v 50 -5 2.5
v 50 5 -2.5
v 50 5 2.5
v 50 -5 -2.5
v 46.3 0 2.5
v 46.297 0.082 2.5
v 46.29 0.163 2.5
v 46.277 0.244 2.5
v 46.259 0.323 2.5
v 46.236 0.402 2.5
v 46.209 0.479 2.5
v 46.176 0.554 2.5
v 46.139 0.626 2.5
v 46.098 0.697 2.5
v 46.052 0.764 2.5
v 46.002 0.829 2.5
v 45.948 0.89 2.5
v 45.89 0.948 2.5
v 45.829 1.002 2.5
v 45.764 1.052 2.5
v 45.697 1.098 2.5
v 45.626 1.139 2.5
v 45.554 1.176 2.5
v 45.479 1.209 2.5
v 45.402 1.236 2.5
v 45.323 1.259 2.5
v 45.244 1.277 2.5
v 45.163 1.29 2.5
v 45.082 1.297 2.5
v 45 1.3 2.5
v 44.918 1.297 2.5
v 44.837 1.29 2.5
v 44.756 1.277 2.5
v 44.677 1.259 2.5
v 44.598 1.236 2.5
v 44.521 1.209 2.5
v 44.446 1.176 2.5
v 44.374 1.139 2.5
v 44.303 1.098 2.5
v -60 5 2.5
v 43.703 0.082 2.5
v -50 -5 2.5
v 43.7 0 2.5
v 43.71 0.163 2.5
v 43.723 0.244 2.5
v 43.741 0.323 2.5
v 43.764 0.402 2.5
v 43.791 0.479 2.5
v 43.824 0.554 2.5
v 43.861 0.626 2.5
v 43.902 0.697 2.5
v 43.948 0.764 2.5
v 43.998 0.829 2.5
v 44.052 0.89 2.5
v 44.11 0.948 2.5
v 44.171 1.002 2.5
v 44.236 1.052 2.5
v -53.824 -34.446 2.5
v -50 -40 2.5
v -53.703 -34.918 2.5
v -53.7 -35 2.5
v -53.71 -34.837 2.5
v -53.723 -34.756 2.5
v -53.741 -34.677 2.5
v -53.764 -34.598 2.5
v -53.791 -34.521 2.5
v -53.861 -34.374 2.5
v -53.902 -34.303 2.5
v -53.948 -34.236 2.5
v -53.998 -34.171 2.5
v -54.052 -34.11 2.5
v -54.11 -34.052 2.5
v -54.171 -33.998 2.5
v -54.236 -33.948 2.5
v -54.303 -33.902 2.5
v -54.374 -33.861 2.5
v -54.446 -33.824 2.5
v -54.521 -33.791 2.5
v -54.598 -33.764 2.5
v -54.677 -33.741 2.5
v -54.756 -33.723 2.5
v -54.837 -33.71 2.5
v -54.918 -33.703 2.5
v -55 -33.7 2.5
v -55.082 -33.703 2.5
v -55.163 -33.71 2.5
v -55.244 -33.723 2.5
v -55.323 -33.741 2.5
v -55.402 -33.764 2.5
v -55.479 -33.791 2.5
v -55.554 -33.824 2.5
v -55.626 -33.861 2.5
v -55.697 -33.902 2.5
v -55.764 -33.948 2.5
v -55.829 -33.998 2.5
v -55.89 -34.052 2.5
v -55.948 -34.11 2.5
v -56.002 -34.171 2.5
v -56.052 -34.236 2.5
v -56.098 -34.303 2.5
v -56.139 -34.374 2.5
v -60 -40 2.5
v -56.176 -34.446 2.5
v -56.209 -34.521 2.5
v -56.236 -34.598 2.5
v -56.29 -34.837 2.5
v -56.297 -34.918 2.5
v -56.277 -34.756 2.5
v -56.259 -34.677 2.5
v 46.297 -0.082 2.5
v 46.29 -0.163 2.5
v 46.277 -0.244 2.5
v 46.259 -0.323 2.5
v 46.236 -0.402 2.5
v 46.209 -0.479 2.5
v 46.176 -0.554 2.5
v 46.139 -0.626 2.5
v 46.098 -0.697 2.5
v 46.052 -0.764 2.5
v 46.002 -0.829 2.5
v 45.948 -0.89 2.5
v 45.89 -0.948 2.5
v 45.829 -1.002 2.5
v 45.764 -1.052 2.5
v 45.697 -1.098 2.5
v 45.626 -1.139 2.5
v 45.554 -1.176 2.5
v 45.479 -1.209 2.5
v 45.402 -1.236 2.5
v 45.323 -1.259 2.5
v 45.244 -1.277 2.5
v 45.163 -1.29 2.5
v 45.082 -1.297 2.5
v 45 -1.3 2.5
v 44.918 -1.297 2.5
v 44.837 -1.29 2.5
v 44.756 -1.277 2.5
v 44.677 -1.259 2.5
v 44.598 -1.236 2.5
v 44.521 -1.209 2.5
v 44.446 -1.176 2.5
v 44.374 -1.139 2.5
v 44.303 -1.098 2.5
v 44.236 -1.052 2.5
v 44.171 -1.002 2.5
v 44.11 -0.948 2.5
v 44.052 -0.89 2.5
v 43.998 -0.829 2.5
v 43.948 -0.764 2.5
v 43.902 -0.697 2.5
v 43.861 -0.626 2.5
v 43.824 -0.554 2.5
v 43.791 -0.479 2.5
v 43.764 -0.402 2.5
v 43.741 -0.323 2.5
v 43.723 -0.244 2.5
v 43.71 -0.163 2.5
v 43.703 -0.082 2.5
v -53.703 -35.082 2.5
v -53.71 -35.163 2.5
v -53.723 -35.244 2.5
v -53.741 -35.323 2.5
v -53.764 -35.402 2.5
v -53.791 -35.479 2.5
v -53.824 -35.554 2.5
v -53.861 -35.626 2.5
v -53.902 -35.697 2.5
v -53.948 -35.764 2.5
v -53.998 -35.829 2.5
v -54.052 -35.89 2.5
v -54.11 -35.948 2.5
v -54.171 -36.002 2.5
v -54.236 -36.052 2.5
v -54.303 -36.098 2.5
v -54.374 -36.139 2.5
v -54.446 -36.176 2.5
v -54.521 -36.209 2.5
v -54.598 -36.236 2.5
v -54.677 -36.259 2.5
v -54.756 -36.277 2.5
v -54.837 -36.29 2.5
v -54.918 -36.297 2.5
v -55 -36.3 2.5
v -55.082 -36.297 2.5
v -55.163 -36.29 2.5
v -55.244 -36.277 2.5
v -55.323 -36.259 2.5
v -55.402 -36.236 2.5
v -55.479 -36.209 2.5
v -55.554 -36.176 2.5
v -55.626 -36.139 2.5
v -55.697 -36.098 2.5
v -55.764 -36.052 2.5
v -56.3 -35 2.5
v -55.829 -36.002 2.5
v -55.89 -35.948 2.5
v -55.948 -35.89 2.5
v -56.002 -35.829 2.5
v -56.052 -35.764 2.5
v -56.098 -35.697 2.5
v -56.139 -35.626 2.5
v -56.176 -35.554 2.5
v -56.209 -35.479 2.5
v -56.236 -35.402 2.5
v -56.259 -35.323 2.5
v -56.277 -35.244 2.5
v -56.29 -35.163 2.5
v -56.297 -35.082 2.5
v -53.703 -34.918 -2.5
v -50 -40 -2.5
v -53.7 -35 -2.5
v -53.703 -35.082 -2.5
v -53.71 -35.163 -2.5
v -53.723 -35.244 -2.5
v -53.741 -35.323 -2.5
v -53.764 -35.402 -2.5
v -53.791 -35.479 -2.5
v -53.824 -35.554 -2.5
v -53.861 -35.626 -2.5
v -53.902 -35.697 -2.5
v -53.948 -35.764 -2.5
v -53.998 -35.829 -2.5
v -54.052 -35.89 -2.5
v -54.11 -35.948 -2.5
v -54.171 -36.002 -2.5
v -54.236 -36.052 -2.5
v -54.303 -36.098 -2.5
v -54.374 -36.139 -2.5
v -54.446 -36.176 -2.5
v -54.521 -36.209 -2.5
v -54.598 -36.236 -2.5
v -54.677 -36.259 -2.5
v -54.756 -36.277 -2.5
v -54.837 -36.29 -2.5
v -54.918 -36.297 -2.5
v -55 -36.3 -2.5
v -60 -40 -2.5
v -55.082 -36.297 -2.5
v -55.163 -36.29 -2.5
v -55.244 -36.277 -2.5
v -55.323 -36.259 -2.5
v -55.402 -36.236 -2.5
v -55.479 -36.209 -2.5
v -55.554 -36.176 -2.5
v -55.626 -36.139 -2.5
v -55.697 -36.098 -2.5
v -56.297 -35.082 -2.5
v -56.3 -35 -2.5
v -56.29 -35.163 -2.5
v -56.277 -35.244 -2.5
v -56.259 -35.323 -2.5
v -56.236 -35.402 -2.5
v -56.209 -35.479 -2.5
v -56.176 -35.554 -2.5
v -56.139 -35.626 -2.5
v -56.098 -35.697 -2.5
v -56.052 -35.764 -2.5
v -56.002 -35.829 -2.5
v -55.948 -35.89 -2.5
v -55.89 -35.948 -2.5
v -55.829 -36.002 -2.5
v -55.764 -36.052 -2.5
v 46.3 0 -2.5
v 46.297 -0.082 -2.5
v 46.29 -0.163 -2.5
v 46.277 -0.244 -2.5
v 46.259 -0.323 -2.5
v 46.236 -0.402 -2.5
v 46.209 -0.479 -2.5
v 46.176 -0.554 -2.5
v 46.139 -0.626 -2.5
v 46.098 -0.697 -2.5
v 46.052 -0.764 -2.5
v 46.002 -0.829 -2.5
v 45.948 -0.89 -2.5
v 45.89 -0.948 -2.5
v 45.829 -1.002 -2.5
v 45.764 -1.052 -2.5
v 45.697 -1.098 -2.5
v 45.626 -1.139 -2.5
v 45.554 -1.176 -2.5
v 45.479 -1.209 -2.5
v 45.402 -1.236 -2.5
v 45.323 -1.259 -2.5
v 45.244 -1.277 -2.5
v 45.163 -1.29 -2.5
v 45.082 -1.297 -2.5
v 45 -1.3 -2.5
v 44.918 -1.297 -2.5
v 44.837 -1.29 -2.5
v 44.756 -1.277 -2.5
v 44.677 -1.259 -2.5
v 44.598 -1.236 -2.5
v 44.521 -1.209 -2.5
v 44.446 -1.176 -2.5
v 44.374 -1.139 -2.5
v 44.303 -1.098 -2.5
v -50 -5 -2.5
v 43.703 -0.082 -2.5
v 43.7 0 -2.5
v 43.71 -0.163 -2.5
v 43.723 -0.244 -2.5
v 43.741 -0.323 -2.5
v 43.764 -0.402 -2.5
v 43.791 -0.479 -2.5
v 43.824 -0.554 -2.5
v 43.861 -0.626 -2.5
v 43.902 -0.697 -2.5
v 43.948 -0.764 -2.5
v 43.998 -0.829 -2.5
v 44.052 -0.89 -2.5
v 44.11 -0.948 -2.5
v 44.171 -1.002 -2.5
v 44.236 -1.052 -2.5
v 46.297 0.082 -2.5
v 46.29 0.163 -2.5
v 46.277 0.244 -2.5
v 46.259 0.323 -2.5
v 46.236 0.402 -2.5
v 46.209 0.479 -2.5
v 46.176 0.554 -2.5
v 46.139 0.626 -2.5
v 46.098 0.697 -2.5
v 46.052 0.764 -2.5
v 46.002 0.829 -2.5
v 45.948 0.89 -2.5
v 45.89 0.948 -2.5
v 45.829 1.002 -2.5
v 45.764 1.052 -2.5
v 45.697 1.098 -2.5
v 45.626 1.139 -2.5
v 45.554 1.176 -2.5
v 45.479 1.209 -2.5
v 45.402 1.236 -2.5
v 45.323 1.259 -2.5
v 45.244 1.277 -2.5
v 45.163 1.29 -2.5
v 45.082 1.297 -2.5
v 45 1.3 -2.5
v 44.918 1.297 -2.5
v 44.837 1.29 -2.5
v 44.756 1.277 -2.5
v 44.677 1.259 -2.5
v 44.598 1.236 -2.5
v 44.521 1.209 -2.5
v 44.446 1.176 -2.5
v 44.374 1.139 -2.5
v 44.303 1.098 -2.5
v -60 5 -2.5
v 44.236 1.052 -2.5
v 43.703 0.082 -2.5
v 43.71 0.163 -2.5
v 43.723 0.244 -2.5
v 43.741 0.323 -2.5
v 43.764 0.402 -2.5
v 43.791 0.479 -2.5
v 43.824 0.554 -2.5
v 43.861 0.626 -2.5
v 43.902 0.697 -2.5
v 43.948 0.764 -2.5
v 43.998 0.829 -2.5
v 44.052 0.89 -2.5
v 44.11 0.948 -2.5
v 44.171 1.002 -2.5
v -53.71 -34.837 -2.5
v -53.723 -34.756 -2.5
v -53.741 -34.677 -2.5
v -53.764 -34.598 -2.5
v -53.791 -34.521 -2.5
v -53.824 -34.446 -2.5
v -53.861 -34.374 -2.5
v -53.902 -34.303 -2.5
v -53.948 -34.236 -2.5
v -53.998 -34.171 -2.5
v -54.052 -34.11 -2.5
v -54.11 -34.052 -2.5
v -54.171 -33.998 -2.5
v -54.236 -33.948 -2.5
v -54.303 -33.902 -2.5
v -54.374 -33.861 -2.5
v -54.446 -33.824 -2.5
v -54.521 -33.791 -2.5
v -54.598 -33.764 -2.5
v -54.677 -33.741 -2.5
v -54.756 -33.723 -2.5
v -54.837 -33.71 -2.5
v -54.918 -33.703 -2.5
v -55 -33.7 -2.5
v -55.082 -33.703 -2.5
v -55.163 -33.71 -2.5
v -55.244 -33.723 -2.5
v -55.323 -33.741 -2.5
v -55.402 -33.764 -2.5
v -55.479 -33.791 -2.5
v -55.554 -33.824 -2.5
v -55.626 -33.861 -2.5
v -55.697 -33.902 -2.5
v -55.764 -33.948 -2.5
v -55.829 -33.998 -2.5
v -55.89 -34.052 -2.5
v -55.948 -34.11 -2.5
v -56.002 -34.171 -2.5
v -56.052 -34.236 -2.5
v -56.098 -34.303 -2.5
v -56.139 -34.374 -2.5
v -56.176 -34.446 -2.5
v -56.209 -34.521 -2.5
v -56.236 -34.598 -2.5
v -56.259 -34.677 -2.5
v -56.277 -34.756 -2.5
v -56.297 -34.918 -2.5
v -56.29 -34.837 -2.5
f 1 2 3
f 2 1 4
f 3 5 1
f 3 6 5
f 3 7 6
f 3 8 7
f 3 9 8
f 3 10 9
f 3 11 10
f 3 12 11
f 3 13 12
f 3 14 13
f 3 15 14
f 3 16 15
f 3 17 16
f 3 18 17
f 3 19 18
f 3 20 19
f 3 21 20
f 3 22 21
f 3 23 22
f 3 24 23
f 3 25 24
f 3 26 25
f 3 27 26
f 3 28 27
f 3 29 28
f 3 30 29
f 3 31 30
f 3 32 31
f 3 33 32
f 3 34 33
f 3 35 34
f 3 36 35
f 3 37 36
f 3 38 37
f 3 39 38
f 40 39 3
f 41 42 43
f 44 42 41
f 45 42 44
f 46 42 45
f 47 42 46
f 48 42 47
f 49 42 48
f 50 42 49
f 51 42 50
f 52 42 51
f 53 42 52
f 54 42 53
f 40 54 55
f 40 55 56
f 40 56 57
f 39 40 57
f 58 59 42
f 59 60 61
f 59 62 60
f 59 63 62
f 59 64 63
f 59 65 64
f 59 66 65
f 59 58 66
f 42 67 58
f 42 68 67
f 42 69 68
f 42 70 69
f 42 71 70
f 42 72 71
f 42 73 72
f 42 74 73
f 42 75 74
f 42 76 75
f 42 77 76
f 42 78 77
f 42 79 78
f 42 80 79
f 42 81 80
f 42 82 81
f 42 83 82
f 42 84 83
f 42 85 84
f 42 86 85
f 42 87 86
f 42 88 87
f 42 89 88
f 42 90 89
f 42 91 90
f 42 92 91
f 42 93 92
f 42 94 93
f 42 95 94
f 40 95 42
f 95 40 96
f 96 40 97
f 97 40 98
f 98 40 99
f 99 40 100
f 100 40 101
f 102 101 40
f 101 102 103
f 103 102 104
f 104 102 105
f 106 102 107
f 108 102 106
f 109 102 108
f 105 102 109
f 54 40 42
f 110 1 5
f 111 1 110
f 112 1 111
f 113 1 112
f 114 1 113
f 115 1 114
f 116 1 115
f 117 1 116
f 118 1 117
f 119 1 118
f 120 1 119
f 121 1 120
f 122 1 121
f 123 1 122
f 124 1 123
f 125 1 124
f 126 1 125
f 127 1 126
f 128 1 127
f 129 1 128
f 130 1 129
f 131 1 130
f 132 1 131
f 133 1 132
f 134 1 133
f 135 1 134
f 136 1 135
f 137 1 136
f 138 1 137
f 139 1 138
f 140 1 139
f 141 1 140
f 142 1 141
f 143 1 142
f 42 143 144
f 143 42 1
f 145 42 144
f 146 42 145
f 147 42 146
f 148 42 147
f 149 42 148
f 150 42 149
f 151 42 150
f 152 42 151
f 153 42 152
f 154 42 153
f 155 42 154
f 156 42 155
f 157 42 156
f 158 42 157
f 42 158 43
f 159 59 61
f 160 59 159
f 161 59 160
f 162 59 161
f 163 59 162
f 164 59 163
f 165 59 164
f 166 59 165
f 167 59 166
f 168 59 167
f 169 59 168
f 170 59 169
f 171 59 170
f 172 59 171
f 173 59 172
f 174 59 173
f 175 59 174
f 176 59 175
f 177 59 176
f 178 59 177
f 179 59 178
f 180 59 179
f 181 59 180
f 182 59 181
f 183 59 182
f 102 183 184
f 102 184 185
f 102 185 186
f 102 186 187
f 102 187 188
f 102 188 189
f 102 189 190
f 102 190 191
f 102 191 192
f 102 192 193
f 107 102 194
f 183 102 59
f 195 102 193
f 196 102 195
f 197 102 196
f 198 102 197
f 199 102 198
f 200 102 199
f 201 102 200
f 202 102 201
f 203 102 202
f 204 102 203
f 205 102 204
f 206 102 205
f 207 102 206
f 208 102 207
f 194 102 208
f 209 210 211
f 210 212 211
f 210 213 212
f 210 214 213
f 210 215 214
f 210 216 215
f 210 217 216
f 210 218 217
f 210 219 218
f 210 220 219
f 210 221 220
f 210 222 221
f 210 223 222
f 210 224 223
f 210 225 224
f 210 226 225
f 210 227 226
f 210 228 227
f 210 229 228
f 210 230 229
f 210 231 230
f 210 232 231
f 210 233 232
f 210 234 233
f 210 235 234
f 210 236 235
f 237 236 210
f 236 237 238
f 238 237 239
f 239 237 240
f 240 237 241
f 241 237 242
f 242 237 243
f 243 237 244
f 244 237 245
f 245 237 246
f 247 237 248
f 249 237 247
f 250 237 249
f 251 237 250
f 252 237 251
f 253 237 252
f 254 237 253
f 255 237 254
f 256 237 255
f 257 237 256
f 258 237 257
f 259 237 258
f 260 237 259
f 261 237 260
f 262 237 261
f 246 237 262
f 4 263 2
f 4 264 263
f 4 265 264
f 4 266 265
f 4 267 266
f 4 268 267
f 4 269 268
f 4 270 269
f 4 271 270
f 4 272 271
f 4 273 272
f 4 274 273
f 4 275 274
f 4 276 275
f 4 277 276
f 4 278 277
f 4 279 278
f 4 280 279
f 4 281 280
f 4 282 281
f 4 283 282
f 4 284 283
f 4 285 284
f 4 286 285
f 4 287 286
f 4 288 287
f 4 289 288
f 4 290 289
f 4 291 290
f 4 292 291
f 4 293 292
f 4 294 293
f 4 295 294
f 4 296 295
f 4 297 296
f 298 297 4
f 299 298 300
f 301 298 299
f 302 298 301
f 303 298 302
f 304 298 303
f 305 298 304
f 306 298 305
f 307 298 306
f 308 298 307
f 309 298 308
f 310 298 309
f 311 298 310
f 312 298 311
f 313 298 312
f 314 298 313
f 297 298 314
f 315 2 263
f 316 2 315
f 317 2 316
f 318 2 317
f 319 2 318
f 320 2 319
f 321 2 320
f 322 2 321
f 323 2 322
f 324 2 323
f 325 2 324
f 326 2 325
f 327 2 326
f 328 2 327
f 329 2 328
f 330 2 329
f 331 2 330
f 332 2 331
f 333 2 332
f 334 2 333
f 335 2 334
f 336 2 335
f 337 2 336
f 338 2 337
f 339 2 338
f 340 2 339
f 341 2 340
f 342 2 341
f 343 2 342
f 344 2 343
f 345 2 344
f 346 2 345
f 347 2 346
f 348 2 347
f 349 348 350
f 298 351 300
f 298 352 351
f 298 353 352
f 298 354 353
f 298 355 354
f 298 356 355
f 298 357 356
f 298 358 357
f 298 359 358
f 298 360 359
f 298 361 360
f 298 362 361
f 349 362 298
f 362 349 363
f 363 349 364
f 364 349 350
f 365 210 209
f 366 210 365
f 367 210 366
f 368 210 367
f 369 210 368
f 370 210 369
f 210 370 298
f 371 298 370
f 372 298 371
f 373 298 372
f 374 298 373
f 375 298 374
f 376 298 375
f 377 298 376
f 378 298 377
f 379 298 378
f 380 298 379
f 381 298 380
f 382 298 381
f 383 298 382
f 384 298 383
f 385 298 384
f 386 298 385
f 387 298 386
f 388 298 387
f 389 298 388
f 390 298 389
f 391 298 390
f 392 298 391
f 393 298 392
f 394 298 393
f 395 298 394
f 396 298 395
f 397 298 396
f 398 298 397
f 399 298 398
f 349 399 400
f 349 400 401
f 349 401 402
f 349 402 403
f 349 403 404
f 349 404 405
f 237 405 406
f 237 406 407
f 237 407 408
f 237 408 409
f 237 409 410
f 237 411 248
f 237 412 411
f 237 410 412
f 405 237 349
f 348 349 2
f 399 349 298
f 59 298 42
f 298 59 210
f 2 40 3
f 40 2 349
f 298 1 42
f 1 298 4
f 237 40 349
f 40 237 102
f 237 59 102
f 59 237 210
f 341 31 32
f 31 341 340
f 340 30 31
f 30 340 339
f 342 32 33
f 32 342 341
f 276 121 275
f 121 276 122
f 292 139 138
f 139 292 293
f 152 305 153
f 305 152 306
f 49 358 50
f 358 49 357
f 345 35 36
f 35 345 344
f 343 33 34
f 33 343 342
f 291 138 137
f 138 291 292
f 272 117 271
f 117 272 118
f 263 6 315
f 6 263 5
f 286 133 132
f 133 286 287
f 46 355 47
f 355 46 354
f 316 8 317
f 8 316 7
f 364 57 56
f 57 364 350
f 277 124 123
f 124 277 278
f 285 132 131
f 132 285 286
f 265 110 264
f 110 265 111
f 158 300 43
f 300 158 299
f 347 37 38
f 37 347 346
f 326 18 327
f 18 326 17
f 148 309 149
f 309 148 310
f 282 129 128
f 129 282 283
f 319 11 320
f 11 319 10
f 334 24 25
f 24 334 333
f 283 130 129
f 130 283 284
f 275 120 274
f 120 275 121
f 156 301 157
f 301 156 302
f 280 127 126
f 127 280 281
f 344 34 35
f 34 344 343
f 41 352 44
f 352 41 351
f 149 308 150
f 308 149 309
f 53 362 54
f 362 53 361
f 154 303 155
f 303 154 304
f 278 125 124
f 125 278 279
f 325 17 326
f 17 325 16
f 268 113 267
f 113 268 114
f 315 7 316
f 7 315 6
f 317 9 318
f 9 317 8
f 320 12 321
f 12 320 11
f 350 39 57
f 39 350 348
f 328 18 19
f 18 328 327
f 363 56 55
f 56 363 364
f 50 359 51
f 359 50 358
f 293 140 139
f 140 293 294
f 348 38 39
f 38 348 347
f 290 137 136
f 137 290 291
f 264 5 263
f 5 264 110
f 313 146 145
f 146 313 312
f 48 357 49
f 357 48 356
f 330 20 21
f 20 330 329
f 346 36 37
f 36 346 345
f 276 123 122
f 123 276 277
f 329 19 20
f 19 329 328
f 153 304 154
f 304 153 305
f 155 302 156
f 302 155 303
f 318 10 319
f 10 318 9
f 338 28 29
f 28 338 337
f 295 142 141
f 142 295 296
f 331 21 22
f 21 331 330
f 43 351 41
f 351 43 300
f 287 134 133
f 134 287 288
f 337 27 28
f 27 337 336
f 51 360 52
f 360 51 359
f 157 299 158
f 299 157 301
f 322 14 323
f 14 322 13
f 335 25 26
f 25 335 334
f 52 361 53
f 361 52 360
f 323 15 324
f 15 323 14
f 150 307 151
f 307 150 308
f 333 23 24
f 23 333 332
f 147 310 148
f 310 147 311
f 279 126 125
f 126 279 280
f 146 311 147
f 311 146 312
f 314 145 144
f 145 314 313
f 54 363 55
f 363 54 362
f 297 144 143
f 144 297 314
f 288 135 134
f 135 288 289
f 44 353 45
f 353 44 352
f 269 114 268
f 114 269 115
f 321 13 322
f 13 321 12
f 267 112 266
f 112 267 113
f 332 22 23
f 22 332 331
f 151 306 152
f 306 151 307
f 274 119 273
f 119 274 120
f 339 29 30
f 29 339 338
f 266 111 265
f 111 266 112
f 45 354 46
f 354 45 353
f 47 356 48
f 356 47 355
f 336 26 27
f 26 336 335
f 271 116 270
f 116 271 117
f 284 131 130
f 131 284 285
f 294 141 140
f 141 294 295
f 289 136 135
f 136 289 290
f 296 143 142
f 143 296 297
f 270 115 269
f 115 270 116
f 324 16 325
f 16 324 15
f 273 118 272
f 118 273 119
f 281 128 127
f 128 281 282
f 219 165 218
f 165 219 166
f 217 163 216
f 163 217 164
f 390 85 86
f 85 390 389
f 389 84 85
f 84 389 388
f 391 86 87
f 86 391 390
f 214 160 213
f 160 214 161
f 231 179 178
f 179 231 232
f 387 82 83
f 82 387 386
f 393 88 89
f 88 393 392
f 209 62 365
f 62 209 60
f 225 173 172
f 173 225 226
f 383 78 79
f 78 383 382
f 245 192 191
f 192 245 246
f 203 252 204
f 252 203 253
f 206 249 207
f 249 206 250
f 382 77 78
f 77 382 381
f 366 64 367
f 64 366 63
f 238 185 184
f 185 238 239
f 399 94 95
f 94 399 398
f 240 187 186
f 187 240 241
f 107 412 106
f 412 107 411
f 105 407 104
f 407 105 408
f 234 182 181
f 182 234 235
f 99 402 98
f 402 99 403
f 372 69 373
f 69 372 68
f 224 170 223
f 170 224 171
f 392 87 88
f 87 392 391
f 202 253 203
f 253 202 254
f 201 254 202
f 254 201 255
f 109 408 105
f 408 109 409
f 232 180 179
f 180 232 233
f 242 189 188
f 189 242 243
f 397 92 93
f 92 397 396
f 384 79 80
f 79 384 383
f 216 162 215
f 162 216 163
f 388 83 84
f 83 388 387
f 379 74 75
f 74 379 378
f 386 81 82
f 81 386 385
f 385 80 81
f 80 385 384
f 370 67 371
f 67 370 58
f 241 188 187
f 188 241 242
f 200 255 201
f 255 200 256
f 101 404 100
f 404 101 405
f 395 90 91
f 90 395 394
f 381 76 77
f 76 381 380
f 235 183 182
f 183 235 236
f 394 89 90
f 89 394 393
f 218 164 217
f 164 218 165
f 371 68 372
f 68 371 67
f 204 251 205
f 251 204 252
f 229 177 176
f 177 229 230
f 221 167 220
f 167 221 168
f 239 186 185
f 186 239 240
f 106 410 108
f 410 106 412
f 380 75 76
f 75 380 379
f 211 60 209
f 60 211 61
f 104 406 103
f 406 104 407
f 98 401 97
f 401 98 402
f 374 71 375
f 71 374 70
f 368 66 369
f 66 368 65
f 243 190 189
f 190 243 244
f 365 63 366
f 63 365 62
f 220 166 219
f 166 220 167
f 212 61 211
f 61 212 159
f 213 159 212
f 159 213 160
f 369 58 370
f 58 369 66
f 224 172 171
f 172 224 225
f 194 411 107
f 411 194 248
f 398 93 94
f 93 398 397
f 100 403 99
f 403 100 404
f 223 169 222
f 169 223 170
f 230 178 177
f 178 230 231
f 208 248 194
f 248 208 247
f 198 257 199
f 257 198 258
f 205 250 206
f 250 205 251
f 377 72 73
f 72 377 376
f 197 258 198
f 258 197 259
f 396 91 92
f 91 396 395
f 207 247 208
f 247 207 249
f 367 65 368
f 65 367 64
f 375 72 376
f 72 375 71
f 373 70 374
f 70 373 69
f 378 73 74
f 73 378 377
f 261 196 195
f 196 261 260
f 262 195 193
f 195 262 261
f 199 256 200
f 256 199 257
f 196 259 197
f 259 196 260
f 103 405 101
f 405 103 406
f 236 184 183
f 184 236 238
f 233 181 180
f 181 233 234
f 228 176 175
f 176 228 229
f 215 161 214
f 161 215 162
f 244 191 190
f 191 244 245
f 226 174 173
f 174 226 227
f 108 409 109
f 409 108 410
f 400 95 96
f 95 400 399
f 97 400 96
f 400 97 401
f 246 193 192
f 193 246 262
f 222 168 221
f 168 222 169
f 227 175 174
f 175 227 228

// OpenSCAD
difference(){
	union(){

       translate([0,0,0]){
           cube([100,10,5], center=true);
       }
       translate([-55,-45/2+5,0]){
           cube([10,45,5], center=true);
       }

	
	}
	union() {

       translate([90/2,0,-10]){
            rotate(a = [0,0,90]) {
              cylinder(h=100, r=1.3, $fn=100, center=false);
            }
       }	
       translate([-90/2-10,-35,-10]){
            rotate(a = [0,0,90]) {
              cylinder(h=100, r=1.3, $fn=100, center=false);
            }
       }        
	}
}
